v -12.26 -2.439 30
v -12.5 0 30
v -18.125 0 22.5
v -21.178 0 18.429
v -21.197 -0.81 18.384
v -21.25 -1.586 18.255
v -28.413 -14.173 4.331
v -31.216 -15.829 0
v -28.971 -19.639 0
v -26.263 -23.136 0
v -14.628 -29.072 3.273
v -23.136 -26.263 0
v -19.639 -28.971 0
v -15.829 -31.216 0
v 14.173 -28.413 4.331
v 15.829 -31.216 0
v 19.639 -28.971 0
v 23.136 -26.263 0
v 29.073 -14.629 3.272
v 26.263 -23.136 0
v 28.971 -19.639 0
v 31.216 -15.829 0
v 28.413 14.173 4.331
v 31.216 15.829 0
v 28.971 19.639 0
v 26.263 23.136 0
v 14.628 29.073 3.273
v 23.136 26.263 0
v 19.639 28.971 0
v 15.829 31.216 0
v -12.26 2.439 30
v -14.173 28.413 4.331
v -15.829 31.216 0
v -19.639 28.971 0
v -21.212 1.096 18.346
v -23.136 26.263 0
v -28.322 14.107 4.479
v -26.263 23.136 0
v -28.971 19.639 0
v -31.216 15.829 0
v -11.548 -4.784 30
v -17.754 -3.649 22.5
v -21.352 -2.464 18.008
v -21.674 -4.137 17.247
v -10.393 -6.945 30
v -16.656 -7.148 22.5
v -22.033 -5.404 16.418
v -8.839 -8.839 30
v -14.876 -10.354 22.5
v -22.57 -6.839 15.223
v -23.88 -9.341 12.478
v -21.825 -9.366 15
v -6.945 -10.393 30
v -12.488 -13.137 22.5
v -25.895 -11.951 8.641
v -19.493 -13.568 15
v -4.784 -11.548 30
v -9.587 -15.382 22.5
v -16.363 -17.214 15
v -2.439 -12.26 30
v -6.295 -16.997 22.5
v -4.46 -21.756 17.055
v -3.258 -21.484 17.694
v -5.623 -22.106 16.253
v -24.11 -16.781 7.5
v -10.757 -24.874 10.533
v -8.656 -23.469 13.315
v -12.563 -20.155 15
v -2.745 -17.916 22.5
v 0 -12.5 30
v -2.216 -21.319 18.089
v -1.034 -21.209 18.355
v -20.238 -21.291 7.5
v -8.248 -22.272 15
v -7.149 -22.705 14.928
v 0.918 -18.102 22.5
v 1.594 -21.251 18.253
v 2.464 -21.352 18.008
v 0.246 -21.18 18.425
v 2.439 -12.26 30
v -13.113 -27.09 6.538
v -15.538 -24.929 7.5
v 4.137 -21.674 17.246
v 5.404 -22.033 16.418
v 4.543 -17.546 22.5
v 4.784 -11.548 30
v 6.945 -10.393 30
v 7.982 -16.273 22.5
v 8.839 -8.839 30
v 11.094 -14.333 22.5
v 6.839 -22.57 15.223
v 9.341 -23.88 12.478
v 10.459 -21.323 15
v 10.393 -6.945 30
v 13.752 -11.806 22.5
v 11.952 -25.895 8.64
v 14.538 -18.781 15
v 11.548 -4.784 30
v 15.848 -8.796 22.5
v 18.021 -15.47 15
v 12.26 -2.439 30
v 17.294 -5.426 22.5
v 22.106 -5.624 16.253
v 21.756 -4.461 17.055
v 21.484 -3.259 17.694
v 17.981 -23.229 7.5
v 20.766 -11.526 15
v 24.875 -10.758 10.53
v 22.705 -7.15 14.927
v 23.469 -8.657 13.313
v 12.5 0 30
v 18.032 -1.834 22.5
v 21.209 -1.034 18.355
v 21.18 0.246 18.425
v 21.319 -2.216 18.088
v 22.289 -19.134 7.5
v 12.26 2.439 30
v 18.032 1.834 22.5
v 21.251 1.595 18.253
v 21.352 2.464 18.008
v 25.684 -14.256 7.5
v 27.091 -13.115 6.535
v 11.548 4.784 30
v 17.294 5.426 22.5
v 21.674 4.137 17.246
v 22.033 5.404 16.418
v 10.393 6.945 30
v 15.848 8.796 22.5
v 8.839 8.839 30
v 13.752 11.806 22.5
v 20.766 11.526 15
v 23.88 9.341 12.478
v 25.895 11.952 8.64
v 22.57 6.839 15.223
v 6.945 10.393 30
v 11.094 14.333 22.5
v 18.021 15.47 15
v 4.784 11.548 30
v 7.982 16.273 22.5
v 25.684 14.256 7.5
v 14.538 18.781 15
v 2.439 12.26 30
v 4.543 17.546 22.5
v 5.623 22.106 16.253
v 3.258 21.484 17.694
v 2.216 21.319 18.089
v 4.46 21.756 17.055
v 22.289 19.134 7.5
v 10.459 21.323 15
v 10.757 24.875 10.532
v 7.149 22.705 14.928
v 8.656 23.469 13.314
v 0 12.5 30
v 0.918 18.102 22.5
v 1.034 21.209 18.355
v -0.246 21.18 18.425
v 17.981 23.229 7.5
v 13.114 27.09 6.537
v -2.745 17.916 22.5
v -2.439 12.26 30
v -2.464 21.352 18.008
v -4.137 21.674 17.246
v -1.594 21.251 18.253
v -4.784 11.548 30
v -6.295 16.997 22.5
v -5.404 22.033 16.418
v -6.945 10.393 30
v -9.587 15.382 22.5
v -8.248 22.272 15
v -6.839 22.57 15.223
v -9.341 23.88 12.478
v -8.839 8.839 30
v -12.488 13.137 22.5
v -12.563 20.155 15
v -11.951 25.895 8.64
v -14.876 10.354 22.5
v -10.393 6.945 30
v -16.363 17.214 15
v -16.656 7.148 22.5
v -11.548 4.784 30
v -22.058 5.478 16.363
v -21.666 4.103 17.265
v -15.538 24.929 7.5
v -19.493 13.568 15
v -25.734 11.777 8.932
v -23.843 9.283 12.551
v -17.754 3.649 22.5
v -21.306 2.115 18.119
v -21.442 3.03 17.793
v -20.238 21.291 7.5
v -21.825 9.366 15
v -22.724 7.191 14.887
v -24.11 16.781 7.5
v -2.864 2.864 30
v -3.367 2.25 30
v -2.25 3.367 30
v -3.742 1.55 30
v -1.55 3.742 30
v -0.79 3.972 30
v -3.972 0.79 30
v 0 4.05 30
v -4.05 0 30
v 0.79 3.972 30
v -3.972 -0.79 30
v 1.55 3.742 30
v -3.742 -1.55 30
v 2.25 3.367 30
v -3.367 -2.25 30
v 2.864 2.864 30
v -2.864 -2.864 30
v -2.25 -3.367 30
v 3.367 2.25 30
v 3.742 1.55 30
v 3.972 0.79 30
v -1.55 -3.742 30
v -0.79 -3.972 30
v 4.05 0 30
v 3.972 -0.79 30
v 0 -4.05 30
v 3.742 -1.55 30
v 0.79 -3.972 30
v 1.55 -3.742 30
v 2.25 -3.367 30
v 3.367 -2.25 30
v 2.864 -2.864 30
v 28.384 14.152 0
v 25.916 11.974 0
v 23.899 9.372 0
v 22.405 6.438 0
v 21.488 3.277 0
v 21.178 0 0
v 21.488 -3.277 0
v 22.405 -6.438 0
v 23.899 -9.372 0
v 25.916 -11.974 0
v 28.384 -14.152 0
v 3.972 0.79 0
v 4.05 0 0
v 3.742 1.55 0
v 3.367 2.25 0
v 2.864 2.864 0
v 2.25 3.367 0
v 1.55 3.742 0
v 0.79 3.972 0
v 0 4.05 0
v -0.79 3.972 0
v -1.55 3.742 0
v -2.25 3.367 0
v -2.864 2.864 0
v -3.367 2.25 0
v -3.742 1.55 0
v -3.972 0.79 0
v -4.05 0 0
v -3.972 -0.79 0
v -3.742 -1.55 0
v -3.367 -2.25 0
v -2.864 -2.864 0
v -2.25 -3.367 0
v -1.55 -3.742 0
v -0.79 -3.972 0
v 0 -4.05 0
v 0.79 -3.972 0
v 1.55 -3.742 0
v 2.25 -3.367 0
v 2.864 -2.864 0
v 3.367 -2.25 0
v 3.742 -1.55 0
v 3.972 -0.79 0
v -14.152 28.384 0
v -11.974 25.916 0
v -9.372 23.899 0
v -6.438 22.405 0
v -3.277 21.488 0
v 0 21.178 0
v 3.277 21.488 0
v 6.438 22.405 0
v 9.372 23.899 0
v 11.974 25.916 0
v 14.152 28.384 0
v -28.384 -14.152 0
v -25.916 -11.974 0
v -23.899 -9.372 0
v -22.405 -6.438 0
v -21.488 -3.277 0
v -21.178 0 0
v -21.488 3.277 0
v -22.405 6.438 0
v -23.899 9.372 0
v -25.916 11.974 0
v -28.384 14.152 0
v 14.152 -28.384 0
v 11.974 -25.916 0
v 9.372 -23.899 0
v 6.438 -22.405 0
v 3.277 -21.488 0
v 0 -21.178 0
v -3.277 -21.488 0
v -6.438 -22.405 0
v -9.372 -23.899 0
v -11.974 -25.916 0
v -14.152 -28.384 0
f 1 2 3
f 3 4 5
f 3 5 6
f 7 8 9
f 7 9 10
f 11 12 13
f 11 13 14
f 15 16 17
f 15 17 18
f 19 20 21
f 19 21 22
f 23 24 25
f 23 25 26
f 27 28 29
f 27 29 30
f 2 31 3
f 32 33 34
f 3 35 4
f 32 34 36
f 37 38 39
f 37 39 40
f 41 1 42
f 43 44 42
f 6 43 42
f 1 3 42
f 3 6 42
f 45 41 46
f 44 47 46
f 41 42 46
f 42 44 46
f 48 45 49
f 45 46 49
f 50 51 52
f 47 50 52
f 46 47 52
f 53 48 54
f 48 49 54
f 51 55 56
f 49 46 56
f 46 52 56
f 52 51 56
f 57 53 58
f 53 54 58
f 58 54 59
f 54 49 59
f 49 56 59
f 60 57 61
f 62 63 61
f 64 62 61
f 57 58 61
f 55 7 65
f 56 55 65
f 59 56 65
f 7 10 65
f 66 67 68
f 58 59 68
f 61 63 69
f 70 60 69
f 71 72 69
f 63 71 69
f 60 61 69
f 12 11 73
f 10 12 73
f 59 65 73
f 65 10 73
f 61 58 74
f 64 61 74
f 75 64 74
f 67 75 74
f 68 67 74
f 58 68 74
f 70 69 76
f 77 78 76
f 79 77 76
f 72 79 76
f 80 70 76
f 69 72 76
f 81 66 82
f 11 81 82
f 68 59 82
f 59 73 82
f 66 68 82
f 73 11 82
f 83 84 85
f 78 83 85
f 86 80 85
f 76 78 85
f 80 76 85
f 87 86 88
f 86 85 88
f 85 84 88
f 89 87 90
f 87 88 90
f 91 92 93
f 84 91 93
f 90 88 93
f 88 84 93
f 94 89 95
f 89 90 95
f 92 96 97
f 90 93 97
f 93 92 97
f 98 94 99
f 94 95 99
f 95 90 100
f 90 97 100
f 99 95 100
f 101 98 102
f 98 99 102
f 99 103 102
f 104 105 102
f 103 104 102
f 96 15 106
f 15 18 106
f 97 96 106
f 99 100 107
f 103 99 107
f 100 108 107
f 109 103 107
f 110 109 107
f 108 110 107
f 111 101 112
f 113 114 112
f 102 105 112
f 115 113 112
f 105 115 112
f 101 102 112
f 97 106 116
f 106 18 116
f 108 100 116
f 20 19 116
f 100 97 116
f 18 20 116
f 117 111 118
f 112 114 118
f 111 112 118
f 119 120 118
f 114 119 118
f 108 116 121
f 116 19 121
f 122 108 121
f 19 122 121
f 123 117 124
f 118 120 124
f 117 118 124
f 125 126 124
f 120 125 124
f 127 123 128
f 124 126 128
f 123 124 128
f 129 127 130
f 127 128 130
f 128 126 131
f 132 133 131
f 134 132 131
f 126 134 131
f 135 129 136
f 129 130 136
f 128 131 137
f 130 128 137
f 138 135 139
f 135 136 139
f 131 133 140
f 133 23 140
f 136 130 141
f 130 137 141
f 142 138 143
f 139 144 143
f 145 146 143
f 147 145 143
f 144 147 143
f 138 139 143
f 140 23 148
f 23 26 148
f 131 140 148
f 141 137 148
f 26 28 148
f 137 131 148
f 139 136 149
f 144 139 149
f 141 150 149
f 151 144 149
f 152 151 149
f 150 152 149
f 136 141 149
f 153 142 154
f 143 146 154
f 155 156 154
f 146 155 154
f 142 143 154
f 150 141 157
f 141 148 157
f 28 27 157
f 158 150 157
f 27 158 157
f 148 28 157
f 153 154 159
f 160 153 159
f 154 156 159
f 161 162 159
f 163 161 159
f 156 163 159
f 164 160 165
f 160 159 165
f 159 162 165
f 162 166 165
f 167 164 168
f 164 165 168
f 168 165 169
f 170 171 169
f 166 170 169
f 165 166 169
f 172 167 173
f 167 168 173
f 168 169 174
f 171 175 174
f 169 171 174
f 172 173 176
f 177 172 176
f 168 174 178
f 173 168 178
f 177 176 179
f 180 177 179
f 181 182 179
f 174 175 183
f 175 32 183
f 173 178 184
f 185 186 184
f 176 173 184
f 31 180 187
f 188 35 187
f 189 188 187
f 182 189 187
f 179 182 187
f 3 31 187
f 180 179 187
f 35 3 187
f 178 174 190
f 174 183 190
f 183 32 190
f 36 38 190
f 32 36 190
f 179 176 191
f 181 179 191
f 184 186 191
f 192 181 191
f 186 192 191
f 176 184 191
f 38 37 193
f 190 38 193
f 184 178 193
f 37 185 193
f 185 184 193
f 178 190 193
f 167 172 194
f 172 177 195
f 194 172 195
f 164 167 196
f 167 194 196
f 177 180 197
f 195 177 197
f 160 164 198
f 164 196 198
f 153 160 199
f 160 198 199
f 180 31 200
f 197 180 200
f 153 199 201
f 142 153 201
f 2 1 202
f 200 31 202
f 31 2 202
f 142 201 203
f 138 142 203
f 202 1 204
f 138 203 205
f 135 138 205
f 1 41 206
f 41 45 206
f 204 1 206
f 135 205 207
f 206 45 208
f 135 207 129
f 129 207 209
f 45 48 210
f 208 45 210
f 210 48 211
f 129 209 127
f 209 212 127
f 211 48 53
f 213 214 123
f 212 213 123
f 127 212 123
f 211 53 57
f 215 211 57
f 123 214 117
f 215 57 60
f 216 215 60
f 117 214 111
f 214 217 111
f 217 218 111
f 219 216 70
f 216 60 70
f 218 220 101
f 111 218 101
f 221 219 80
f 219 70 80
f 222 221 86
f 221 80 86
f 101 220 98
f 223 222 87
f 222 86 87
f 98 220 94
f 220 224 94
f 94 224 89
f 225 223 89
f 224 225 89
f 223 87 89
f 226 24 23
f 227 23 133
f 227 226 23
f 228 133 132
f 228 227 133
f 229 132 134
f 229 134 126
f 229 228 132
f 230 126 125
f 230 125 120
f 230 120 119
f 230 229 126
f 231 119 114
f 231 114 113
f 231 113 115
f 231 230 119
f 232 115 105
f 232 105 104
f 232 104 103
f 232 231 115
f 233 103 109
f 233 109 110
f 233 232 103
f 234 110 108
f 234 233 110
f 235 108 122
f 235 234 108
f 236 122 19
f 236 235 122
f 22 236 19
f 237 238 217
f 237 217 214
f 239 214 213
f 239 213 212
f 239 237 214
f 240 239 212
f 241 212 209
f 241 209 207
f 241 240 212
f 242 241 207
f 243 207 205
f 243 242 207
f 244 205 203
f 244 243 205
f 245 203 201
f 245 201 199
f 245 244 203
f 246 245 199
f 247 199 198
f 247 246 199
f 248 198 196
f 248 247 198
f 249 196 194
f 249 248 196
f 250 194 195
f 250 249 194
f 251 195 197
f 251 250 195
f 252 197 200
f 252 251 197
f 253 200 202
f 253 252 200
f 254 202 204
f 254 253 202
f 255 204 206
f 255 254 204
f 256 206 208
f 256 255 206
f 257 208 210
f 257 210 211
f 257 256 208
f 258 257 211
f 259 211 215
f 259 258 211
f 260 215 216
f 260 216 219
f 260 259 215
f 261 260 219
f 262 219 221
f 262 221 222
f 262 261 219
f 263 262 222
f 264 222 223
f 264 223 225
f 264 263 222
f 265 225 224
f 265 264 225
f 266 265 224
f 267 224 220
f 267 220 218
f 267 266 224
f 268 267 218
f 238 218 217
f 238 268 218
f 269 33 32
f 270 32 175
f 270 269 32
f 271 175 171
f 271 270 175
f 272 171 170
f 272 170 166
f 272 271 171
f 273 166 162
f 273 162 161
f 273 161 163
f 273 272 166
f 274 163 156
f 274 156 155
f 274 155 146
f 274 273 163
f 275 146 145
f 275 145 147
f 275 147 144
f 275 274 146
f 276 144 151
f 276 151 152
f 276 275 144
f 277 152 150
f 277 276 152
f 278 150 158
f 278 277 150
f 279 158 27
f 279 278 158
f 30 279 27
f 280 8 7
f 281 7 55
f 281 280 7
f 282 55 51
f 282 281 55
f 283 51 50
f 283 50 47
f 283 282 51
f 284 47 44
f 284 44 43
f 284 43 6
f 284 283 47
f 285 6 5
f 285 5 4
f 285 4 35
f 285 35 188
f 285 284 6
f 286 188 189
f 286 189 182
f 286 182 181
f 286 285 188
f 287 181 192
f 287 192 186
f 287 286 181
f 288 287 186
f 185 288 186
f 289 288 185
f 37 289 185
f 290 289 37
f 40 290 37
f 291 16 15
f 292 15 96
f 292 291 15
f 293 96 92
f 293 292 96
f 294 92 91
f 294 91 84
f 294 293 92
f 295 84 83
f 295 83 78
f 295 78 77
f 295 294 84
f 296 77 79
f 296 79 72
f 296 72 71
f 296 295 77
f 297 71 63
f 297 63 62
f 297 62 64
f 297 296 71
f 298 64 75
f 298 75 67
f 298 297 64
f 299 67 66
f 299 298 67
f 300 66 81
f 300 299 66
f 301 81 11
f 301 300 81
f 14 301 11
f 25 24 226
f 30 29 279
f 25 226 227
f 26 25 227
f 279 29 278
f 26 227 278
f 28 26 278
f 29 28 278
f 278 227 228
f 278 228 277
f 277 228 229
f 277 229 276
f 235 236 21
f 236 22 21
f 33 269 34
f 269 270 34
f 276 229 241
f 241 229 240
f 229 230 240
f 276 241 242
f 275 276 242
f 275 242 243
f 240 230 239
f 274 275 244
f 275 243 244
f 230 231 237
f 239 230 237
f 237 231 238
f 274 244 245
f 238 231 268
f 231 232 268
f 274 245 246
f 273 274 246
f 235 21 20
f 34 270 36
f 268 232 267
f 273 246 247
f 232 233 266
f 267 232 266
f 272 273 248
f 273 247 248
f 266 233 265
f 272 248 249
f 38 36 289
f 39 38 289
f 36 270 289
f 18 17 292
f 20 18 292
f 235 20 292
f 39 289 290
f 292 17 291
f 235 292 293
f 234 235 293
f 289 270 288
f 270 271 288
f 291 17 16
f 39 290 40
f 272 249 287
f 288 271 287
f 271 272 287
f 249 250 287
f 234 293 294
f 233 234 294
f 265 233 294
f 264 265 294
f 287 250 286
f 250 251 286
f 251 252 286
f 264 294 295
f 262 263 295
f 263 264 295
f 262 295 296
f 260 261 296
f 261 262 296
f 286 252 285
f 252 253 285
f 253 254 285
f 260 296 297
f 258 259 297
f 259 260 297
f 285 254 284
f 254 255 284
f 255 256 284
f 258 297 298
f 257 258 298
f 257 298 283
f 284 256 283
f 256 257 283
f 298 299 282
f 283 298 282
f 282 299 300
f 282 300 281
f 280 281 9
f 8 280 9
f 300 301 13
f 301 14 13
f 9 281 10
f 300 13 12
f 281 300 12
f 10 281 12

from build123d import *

# Parameters (mm, degrees)
F2_R     = 4.05
F3_DEPTH = 30
F4_R     = 17.5
F5_DEPTH = 25


with BuildPart() as f1:
    # F0 (on Front) → F1 (revolve)
    with BuildSketch(Plane.XZ):
        Polygon((-12.5, 30), (-35, 0), (0, 0), (0, 30), align=None)
    revolve(axis=Axis((0, 0, 15), (0, 0, 1)))

    # F2 (on Top) → F3 (cut)
    with BuildSketch(Plane.XY):
        Circle(F2_R)
    extrude(amount=F3_DEPTH, mode=Mode.SUBTRACT)

    # F4 (on Top) → F5 (cut)
    with BuildSketch(Plane.XY):
        with Locations((0, 38.677964)):
            Circle(F4_R)
        with Locations((-38.677964, 0)):
            Circle(F4_R)
        with Locations((0, -38.677964)):
            Circle(F4_R)
        with Locations((38.677964, 0)):
            Circle(F4_R)
    extrude(amount=F5_DEPTH, mode=Mode.SUBTRACT)


solid = f1.part
